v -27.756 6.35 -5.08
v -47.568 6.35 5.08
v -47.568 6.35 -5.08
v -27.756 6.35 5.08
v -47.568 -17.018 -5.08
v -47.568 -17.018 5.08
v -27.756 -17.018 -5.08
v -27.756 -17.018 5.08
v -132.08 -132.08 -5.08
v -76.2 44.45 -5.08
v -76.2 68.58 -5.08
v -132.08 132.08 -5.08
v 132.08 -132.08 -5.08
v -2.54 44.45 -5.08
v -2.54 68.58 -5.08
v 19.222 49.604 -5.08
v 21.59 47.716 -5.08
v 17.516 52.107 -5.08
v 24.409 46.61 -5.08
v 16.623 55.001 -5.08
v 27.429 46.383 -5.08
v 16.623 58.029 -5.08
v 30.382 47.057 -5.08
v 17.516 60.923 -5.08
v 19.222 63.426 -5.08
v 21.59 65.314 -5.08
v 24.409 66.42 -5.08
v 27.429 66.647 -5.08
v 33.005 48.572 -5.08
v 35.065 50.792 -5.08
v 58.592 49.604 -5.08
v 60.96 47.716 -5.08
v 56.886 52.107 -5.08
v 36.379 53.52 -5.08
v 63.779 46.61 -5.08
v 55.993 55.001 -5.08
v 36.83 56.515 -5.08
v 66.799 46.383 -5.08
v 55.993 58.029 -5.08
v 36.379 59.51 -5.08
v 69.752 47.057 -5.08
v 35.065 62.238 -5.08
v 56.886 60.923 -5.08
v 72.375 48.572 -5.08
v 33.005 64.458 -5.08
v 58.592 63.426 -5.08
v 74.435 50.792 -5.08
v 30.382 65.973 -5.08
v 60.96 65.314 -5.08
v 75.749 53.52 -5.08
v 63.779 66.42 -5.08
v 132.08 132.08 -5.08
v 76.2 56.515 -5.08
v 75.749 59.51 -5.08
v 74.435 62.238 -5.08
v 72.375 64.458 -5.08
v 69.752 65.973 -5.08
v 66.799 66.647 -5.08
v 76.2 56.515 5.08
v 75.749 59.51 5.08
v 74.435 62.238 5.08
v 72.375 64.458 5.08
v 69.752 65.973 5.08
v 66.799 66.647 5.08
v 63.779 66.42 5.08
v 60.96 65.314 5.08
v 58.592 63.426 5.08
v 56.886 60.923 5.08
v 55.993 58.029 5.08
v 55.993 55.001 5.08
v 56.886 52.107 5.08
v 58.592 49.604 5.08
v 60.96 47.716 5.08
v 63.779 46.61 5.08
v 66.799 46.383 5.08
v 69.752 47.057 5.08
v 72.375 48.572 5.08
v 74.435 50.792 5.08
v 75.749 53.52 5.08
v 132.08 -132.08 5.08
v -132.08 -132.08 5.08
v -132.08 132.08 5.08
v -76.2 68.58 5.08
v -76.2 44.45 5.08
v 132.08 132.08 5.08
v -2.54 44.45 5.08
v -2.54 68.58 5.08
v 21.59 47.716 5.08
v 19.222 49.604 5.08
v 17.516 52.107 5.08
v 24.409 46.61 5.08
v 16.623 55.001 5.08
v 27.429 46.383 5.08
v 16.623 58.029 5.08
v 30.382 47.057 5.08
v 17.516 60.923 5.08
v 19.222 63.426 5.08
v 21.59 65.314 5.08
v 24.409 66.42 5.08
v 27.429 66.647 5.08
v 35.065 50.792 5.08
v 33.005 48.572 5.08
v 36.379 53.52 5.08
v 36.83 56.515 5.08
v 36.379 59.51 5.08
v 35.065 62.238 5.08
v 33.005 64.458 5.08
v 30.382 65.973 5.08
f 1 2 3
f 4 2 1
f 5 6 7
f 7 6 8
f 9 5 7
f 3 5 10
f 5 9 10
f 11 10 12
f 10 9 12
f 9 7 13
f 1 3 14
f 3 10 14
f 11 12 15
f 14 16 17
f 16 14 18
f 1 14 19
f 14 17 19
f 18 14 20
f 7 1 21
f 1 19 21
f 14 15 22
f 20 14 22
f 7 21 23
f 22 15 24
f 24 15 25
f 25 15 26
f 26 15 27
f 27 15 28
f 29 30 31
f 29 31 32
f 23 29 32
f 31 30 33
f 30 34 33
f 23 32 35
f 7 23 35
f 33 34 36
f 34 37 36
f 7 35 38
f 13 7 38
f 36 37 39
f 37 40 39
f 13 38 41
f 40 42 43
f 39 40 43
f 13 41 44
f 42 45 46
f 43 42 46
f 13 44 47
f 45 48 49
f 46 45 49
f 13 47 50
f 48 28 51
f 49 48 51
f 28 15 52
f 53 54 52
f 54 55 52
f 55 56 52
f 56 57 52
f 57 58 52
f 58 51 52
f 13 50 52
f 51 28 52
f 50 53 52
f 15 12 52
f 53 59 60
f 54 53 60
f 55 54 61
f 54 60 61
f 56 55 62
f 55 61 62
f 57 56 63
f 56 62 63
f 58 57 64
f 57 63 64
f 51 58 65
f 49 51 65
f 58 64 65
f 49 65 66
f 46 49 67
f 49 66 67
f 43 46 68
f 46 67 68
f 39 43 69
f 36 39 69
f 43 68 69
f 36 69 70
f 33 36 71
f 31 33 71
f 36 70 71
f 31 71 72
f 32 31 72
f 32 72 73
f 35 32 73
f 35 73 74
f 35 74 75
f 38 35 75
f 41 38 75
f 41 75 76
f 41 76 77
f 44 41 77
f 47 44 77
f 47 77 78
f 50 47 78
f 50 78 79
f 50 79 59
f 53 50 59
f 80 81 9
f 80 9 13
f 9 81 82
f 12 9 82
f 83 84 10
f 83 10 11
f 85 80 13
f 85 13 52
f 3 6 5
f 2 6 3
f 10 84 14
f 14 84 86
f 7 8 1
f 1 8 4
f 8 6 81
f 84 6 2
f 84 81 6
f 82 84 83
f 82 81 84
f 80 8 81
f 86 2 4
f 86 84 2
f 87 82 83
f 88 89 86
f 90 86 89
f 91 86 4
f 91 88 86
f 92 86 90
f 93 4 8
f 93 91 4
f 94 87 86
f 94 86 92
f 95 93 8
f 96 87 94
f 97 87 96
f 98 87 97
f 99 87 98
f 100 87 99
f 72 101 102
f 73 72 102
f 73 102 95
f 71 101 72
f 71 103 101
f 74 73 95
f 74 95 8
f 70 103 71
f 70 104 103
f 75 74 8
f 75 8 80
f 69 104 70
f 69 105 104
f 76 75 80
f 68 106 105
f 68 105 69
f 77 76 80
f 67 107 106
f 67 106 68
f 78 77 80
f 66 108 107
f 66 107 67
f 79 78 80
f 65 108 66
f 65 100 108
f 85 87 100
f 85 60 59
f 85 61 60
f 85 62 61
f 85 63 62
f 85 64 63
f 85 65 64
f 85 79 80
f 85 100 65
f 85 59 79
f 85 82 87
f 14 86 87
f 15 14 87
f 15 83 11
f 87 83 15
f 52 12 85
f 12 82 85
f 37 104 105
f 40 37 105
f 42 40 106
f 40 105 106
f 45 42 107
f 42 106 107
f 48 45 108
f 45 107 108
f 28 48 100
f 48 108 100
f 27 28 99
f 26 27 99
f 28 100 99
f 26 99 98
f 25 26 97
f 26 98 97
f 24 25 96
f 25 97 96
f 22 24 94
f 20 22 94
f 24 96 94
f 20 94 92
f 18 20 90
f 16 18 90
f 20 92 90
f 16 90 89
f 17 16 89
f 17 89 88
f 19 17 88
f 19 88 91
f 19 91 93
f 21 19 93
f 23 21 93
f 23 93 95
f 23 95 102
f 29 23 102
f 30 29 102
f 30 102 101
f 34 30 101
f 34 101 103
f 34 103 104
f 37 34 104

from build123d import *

# Parameters (mm, degrees)
SKETCH1_W           = 264.16
SKETCH1_H           = 264.16
BOSS_EXTRUDE1_DEPTH = 5.08
SKETCH2_R           = 10.16
SKETCH2_W           = 73.66
SKETCH2_H           = 24.13
SKETCH2_W_2         = 19.812
SKETCH2_H_2         = 23.368
CUT_EXTRUDE1_DEPTH  = 11.16


with BuildPart() as part:
    # Sketch1 → Boss-Extrude1 (new body, symmetric)
    with BuildSketch(Plane.XY):
        Rectangle(SKETCH1_W, SKETCH1_H)
    extrude(amount=BOSS_EXTRUDE1_DEPTH, both=True)

    # Sketch2 → Cut-Extrude1 (cut, through all)
    with BuildSketch(Plane.XY.offset(5.08)):
        with Locations((26.67, 56.515)):
            Circle(SKETCH2_R)
        with Locations((66.04, 56.515)):
            Circle(SKETCH2_R)
        with Locations((-39.37, 56.515)):
            Rectangle(SKETCH2_W, SKETCH2_H)
        with Locations((-37.662476274, -5.334)):
            Rectangle(SKETCH2_W_2, SKETCH2_H_2)
    extrude(amount=-CUT_EXTRUDE1_DEPTH, mode=Mode.SUBTRACT)


solid = part.part
